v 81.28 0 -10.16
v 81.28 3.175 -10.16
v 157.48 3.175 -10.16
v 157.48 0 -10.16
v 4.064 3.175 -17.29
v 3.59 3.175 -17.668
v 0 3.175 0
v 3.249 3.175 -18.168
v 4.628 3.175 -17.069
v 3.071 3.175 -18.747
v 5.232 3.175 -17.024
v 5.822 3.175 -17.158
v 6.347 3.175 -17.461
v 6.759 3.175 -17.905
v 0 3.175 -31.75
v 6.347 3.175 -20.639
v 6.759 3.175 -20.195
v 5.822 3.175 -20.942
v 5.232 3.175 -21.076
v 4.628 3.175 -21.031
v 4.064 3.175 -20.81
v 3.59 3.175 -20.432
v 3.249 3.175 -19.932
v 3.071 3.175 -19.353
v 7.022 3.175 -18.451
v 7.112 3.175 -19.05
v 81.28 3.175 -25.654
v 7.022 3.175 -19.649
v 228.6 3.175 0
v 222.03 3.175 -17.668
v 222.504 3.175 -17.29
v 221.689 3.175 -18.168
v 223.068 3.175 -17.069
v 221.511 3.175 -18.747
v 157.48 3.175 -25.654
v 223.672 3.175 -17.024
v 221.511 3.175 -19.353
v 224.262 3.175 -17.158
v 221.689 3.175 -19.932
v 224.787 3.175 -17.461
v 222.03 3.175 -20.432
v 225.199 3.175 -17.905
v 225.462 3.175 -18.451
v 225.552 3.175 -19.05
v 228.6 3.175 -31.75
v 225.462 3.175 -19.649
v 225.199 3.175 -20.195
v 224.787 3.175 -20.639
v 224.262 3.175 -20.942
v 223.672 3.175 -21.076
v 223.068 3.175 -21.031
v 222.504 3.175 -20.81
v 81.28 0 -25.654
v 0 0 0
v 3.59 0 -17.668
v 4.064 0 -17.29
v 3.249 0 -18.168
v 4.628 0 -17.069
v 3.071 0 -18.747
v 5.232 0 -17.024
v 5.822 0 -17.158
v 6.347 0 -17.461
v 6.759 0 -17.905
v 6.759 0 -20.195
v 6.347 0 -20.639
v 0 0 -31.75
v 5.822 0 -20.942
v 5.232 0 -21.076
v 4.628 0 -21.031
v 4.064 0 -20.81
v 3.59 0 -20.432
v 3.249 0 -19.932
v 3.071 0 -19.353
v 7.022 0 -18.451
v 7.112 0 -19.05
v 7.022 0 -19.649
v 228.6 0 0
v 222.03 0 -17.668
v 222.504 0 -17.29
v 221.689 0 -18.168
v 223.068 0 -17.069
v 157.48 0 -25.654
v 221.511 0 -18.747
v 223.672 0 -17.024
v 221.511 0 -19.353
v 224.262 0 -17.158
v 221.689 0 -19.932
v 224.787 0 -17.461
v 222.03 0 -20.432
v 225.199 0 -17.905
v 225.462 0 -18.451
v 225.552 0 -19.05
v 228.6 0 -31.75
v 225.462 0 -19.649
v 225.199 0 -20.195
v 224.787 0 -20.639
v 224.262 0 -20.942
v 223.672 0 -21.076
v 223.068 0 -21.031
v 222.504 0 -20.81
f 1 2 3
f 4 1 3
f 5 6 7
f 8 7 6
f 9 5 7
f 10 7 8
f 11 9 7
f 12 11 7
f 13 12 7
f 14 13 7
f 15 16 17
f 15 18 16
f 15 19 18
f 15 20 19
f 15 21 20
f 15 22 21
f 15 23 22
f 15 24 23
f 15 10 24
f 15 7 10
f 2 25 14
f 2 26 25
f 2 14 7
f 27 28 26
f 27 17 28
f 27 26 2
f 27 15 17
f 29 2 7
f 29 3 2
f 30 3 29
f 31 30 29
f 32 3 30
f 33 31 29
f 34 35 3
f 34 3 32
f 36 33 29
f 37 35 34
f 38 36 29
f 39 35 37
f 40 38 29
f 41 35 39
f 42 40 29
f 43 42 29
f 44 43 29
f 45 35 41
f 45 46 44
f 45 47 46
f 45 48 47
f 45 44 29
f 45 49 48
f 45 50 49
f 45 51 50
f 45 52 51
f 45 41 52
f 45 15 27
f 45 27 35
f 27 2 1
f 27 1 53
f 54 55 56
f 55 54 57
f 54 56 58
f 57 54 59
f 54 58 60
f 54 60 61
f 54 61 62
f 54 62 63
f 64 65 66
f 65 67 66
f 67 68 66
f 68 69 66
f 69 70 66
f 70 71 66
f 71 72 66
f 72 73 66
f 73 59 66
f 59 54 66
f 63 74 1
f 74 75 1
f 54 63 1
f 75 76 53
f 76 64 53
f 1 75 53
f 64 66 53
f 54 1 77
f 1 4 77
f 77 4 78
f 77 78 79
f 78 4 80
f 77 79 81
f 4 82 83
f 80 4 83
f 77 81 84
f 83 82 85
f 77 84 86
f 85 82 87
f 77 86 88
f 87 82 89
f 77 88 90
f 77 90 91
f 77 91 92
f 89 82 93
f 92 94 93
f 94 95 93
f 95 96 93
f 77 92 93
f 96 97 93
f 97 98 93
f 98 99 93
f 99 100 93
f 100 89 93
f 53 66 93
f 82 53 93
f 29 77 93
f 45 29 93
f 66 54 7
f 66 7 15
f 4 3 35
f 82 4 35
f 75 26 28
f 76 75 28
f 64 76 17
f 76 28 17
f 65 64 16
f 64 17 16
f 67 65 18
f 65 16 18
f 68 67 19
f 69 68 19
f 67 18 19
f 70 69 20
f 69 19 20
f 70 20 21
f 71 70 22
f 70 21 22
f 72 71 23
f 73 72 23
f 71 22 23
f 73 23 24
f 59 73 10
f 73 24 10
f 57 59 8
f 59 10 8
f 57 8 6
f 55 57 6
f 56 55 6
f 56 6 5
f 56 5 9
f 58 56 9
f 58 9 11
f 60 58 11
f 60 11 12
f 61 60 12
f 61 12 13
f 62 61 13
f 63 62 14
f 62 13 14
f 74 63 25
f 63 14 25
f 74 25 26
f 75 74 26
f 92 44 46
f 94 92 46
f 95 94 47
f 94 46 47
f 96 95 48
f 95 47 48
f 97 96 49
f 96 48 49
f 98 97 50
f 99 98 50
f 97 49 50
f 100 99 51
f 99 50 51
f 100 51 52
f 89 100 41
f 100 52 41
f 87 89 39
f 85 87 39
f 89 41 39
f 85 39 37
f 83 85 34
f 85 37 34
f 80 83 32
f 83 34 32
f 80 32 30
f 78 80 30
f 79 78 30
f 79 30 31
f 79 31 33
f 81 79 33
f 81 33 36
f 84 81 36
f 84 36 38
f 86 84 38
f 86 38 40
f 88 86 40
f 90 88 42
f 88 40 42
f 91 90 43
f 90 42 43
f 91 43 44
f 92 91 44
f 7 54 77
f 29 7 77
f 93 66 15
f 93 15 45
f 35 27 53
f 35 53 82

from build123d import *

# Parameters (mm, degrees)
SKETCH1_W           = 228.6
SKETCH1_H           = 31.75
BOSS_EXTRUDE1_DEPTH = 3.175
SKETCH2_R           = 2.032
CUT_EXTRUDE1_DEPTH  = 3.175
SKETCH3_W           = 76.2
SKETCH3_H           = 15.494
CUT_EXTRUDE2_DEPTH  = 3.175


with BuildPart() as part:
    # Sketch1 → Boss-Extrude1 (new body)
    with BuildSketch(Plane(origin=(0, 0, 0), x_dir=(1, 0, 0), z_dir=(0, 1, 0))):
        with Locations((114.3, 15.875)):
            Rectangle(SKETCH1_W, SKETCH1_H)
    extrude(amount=BOSS_EXTRUDE1_DEPTH)

    # Sketch2 → Cut-Extrude1 (cut)
    with BuildSketch(Plane(origin=(0, 3.175, 0), x_dir=(1, 0, 0), z_dir=(0, 1, 0))):
        with Locations((5.08, 19.05)):
            Circle(SKETCH2_R)
        with Locations((223.52, 19.05)):
            Circle(SKETCH2_R)
    extrude(amount=-CUT_EXTRUDE1_DEPTH, mode=Mode.SUBTRACT)

    # Sketch3 → Cut-Extrude2 (cut)
    with BuildSketch(Plane(origin=(0, 3.175, 0), x_dir=(1, 0, 0), z_dir=(0, 1, 0))):
        with Locations((119.38, 17.907)):
            Rectangle(SKETCH3_W, SKETCH3_H)
    extrude(amount=-CUT_EXTRUDE2_DEPTH, mode=Mode.SUBTRACT)


solid = part.part
